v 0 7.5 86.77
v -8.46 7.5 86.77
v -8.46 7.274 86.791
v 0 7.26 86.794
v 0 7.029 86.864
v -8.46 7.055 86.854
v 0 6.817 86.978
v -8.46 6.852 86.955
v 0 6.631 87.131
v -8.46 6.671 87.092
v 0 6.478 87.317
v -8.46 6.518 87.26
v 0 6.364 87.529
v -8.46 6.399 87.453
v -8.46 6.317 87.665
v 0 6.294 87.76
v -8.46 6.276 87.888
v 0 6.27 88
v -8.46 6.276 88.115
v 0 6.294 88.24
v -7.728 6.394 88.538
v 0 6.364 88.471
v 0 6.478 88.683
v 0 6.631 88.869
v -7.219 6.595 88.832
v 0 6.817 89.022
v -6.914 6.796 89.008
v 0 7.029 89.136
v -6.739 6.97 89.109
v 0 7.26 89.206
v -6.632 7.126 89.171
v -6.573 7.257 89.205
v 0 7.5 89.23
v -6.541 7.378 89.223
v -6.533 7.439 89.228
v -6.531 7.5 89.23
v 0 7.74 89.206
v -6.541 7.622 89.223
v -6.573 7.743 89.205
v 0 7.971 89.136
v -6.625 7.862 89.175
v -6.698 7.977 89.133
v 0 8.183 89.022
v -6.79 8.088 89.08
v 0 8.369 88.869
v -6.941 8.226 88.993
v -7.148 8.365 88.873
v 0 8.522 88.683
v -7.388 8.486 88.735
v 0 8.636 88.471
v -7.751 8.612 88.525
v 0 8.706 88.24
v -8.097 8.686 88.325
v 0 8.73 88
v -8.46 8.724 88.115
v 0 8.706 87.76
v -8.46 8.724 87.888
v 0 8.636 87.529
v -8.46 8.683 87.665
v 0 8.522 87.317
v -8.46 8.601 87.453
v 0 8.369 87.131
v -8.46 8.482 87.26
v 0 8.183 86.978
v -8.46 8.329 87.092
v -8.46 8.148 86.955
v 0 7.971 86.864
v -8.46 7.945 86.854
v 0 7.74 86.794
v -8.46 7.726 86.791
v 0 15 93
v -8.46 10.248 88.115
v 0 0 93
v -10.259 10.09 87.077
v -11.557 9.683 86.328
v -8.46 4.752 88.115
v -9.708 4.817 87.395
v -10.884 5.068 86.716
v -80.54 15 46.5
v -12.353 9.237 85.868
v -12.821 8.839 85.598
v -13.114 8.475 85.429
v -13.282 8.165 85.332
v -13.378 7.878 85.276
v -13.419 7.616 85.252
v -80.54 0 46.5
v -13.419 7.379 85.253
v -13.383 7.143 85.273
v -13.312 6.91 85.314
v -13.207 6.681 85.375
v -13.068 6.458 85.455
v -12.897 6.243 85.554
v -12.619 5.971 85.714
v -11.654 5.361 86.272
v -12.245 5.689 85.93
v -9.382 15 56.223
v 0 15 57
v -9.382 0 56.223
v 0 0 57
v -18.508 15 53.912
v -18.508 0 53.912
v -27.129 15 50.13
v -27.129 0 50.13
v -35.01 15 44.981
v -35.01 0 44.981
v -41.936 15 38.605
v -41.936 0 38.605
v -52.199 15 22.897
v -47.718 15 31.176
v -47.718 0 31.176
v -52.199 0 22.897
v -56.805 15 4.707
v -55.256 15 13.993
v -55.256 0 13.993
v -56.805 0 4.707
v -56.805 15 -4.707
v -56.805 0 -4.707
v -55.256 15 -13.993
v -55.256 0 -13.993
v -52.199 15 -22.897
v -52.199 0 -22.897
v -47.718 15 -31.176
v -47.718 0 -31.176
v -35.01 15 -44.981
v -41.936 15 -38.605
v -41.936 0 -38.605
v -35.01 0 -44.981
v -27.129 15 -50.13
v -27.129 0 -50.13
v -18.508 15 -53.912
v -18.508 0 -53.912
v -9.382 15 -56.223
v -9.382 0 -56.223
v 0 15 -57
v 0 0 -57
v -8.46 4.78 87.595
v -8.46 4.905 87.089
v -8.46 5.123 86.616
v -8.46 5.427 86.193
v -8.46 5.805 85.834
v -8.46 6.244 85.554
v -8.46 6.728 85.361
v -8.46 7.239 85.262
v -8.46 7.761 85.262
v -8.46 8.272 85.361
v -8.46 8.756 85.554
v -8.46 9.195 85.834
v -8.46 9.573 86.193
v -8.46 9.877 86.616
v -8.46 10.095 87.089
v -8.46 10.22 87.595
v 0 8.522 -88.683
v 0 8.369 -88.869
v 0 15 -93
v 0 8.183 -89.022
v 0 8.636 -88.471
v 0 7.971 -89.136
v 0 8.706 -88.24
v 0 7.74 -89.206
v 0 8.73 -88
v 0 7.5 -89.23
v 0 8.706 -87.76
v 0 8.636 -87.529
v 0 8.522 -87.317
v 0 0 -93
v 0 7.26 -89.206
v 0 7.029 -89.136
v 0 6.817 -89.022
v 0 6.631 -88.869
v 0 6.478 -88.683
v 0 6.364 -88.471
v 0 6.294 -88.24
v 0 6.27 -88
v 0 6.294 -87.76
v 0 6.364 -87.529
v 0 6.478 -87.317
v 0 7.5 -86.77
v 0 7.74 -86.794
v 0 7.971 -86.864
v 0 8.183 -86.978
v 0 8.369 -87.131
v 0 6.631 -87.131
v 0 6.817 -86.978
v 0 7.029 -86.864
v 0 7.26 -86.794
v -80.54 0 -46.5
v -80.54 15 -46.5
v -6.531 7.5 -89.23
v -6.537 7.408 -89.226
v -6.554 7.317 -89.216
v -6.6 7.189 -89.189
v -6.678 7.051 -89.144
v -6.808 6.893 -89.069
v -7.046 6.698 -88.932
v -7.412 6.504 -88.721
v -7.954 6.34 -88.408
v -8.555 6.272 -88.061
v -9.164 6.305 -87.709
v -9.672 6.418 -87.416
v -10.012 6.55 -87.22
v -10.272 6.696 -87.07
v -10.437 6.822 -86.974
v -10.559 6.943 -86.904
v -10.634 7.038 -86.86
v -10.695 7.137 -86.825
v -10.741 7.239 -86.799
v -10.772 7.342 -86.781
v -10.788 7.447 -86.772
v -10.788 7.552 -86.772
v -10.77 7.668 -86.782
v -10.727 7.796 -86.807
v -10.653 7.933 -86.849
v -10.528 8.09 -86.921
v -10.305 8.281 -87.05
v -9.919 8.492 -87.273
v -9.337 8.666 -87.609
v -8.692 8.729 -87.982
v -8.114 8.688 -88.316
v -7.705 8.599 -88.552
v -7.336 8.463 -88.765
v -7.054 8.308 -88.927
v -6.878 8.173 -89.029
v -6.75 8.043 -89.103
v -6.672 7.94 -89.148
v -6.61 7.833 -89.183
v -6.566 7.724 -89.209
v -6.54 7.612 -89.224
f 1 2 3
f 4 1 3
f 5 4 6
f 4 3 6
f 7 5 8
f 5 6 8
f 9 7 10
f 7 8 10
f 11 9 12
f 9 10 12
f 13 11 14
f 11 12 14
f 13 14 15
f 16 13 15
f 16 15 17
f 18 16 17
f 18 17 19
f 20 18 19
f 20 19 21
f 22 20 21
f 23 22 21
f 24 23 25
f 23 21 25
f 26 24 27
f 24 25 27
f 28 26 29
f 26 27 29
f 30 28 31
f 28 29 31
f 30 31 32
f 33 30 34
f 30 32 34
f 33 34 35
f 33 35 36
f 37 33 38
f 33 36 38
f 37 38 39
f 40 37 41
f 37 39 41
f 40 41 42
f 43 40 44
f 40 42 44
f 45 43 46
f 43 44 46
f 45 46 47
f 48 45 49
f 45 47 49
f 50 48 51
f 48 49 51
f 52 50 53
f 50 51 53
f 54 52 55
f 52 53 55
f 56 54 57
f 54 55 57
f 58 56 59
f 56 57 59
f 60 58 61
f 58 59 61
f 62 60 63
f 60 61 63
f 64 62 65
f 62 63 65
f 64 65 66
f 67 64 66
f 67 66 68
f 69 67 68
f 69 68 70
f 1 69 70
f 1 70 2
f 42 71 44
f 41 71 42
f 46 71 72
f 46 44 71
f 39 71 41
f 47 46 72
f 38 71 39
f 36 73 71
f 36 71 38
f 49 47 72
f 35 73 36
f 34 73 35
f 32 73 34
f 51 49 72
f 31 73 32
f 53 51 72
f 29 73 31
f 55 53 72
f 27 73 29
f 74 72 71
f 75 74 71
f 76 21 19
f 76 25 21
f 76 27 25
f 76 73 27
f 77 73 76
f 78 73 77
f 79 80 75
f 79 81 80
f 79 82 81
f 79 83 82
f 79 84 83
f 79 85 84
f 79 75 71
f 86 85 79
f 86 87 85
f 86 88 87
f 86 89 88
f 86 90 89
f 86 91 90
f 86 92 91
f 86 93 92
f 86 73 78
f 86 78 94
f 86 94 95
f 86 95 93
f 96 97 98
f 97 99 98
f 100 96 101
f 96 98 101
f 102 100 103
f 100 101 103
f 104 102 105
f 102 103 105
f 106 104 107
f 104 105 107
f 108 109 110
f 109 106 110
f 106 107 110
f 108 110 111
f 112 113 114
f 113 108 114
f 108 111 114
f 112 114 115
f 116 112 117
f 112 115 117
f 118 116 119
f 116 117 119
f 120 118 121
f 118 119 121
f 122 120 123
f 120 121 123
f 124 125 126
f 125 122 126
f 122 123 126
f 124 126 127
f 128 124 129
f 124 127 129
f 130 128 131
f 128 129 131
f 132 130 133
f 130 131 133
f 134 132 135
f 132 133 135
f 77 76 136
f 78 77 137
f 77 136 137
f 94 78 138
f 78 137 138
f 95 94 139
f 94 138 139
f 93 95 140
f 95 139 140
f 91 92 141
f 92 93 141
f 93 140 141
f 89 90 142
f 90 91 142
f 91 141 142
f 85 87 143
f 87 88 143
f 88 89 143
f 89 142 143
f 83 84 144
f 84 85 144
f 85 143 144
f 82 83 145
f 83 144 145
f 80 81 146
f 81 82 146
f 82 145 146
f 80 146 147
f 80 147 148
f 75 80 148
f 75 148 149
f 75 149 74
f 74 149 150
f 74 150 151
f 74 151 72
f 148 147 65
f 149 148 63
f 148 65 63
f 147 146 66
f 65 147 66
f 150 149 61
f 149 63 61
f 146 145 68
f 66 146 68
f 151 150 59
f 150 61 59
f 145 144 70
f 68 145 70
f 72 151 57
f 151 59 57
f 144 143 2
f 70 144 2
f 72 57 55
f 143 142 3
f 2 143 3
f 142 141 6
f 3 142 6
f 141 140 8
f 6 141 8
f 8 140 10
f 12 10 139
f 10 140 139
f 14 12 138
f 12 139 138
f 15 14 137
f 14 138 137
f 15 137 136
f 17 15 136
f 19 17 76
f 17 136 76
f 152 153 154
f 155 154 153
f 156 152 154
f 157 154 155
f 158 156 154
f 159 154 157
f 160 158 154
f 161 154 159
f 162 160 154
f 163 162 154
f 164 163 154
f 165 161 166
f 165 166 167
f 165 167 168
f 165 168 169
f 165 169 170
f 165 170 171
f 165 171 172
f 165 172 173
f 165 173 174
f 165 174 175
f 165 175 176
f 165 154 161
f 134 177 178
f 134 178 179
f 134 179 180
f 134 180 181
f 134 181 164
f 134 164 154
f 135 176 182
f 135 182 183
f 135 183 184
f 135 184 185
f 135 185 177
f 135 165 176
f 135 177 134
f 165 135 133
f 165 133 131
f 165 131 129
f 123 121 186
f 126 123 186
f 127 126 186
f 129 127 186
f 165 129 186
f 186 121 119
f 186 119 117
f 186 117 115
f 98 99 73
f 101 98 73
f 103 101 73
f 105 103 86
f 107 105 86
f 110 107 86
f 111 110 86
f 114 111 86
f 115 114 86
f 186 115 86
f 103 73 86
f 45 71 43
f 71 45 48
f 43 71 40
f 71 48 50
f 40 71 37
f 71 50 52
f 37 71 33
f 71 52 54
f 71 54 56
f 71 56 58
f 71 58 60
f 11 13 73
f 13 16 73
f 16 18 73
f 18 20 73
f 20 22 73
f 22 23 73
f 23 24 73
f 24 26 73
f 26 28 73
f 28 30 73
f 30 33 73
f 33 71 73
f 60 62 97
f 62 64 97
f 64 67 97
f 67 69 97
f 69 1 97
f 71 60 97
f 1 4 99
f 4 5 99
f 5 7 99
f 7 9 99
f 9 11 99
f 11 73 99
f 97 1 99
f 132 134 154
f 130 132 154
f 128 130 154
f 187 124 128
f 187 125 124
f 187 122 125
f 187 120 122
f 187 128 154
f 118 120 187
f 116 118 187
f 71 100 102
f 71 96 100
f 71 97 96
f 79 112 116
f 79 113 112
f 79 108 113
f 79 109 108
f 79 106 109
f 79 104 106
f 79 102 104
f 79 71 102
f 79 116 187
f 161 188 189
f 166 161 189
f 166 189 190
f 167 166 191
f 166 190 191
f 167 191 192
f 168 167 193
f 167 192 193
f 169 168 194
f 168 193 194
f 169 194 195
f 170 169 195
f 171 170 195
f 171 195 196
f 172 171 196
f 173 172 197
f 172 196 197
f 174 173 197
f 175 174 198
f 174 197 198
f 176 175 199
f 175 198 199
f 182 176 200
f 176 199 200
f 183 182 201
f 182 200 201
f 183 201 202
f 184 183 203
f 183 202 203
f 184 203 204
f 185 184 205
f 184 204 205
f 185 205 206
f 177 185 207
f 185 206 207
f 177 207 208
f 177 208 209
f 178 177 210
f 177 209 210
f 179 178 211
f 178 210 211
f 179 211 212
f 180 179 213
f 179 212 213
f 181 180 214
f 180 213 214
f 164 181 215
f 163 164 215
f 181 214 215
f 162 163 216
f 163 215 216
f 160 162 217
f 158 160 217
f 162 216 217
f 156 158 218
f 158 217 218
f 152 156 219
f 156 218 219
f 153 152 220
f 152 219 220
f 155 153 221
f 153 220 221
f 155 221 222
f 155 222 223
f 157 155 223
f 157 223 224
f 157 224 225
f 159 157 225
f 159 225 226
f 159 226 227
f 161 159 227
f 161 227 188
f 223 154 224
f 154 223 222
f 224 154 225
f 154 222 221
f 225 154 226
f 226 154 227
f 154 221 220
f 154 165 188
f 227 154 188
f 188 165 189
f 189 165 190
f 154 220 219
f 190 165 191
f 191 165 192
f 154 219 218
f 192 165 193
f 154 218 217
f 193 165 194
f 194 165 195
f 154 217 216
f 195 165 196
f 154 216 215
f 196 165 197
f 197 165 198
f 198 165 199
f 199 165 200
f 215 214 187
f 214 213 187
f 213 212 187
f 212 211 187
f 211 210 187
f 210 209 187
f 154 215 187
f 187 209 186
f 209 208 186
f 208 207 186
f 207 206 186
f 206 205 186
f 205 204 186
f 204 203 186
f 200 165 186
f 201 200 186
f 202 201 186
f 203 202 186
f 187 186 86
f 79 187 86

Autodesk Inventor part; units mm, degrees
sketch "スケッチ1" plane through (0, 0, 0) normal (0, 1, 0) x (-1, 0, 0)
  arc A0 (0, -57) -> (0, 57) centre (0, 0) ccw
  line L0 (0, 0) -> (80.5404, 46.5) construction
  line L1 (0, 0) -> (0, 93) construction
  line L2 (0, 93) -> (80.5404, 46.5)
  line L3 (80.5404, 46.5) -> (80.5404, 0)
  line L4 (80.5404, 0) -> (57, 0)
  line L5 (0, 0) -> (0, -93) construction
  line L6 (0, -93) -> (80.5404, -46.5)
  line L7 (80.5404, -46.5) -> (80.5404, 0)
  line L8 (0, -93) -> (0, -57)
  line L9 (0, 93) -> (0, 57)
  dimension "d0" = 57
extrude "押し出し1" add sketch "スケッチ1" along normal blind 15
sketch "スケッチ2" plane through (0, 0, 93) normal (1, 0, 0) x (0, 0, -1)
  line L0 (36, 0) -> (36, 15) projected
  line L1 (36, 15) -> (5, 15)
  line L2 (46.5, 15) -> (0, 15) projected
  line L3 (5, 15) -> (5, 7.5)
  line L4 (93, 0) -> (93, 15)
  line L5 (139.5, 15) -> (46.5, 15) projected
  line L6 (181, 15) -> (181, 7.5)
  dimension "d5" = 31
  dimension "d6" = 7.5
hole "穴1" at (0, 7.5, 88) direction (-1, 0, 0) diameter 2.459 end through all thread size "M3x0.5" class "6H" standard "ISO Metric profile"
sketch "スケッチ3" plane through (0, 0, 93) normal (-0.5, 0, 0.866) x (0.866, 0, 0.5)
  ellipse E0 centre (-10, 7.5) end of major axis (-12.459, 7.5) minor radius 1.2295 projected
  point P0 (-46.5, 0)
  point P1 (-7.541, 7.5)
sketch "スケッチ5" plane through (0, 0, 93) normal (-0.5, 0, 0.866) x (0.866, 0, 0.5)
  ellipse E0 centre (-10, 7.5) end of major axis (-12.459, 7.5) minor radius 1.2295 projected
  point P0 (-46.5, 0)
  point P1 (-12.459, 7.5)
ref_plane "作業平面3" through (-8.6603, 7.5, 88) normal (0, 0, -1) x (-1, 0, 0)
sketch "スケッチ7" plane through (-8.6603, 7.5, 88) normal (0, 0, -1) x (-1, 0, 0)
  line L0 (0, 0) -> (4.8, 0)
  point P0 (-8.6603, -7.5)
  dimension "d21" = 4.8
ref_plane "作業平面4" through (-13.4603, 7.5, 88) normal (-1, 0, 0) x (0, 0, 1)
sketch "スケッチ8" plane through (-13.4603, 7.5, 88) normal (-1, 0, 0) x (0, 0, 1)
  point P0 (-88, -7.5)
  point P1 (0, 0)
hole "穴3" at (-13.4603, 7.5, 88) direction (1, 0, 0) diameter 2.459 end through all counterbore diameter 5.5 counterbore depth 5 thread size "M3x0.5" class "6H" standard "ISO Metric profile"
sketch "スケッチ9" plane through (0, 15, 0) normal (0, 1, 0) x (1, 0, 0)
  point P0 (0, 0)
  point P1 (0, 0)
ref_plane "作業平面5" through (0, 15, 0) normal (0, 0, 1) x (1, 0, 0)
hole "穴4" at (0, 7.5, -88) direction (-1, 0, 0) diameter 2.459 end through all thread size "M3x0.5" class "6H" standard "ISO Metric profile"
properties part number "nowtrying_up"
